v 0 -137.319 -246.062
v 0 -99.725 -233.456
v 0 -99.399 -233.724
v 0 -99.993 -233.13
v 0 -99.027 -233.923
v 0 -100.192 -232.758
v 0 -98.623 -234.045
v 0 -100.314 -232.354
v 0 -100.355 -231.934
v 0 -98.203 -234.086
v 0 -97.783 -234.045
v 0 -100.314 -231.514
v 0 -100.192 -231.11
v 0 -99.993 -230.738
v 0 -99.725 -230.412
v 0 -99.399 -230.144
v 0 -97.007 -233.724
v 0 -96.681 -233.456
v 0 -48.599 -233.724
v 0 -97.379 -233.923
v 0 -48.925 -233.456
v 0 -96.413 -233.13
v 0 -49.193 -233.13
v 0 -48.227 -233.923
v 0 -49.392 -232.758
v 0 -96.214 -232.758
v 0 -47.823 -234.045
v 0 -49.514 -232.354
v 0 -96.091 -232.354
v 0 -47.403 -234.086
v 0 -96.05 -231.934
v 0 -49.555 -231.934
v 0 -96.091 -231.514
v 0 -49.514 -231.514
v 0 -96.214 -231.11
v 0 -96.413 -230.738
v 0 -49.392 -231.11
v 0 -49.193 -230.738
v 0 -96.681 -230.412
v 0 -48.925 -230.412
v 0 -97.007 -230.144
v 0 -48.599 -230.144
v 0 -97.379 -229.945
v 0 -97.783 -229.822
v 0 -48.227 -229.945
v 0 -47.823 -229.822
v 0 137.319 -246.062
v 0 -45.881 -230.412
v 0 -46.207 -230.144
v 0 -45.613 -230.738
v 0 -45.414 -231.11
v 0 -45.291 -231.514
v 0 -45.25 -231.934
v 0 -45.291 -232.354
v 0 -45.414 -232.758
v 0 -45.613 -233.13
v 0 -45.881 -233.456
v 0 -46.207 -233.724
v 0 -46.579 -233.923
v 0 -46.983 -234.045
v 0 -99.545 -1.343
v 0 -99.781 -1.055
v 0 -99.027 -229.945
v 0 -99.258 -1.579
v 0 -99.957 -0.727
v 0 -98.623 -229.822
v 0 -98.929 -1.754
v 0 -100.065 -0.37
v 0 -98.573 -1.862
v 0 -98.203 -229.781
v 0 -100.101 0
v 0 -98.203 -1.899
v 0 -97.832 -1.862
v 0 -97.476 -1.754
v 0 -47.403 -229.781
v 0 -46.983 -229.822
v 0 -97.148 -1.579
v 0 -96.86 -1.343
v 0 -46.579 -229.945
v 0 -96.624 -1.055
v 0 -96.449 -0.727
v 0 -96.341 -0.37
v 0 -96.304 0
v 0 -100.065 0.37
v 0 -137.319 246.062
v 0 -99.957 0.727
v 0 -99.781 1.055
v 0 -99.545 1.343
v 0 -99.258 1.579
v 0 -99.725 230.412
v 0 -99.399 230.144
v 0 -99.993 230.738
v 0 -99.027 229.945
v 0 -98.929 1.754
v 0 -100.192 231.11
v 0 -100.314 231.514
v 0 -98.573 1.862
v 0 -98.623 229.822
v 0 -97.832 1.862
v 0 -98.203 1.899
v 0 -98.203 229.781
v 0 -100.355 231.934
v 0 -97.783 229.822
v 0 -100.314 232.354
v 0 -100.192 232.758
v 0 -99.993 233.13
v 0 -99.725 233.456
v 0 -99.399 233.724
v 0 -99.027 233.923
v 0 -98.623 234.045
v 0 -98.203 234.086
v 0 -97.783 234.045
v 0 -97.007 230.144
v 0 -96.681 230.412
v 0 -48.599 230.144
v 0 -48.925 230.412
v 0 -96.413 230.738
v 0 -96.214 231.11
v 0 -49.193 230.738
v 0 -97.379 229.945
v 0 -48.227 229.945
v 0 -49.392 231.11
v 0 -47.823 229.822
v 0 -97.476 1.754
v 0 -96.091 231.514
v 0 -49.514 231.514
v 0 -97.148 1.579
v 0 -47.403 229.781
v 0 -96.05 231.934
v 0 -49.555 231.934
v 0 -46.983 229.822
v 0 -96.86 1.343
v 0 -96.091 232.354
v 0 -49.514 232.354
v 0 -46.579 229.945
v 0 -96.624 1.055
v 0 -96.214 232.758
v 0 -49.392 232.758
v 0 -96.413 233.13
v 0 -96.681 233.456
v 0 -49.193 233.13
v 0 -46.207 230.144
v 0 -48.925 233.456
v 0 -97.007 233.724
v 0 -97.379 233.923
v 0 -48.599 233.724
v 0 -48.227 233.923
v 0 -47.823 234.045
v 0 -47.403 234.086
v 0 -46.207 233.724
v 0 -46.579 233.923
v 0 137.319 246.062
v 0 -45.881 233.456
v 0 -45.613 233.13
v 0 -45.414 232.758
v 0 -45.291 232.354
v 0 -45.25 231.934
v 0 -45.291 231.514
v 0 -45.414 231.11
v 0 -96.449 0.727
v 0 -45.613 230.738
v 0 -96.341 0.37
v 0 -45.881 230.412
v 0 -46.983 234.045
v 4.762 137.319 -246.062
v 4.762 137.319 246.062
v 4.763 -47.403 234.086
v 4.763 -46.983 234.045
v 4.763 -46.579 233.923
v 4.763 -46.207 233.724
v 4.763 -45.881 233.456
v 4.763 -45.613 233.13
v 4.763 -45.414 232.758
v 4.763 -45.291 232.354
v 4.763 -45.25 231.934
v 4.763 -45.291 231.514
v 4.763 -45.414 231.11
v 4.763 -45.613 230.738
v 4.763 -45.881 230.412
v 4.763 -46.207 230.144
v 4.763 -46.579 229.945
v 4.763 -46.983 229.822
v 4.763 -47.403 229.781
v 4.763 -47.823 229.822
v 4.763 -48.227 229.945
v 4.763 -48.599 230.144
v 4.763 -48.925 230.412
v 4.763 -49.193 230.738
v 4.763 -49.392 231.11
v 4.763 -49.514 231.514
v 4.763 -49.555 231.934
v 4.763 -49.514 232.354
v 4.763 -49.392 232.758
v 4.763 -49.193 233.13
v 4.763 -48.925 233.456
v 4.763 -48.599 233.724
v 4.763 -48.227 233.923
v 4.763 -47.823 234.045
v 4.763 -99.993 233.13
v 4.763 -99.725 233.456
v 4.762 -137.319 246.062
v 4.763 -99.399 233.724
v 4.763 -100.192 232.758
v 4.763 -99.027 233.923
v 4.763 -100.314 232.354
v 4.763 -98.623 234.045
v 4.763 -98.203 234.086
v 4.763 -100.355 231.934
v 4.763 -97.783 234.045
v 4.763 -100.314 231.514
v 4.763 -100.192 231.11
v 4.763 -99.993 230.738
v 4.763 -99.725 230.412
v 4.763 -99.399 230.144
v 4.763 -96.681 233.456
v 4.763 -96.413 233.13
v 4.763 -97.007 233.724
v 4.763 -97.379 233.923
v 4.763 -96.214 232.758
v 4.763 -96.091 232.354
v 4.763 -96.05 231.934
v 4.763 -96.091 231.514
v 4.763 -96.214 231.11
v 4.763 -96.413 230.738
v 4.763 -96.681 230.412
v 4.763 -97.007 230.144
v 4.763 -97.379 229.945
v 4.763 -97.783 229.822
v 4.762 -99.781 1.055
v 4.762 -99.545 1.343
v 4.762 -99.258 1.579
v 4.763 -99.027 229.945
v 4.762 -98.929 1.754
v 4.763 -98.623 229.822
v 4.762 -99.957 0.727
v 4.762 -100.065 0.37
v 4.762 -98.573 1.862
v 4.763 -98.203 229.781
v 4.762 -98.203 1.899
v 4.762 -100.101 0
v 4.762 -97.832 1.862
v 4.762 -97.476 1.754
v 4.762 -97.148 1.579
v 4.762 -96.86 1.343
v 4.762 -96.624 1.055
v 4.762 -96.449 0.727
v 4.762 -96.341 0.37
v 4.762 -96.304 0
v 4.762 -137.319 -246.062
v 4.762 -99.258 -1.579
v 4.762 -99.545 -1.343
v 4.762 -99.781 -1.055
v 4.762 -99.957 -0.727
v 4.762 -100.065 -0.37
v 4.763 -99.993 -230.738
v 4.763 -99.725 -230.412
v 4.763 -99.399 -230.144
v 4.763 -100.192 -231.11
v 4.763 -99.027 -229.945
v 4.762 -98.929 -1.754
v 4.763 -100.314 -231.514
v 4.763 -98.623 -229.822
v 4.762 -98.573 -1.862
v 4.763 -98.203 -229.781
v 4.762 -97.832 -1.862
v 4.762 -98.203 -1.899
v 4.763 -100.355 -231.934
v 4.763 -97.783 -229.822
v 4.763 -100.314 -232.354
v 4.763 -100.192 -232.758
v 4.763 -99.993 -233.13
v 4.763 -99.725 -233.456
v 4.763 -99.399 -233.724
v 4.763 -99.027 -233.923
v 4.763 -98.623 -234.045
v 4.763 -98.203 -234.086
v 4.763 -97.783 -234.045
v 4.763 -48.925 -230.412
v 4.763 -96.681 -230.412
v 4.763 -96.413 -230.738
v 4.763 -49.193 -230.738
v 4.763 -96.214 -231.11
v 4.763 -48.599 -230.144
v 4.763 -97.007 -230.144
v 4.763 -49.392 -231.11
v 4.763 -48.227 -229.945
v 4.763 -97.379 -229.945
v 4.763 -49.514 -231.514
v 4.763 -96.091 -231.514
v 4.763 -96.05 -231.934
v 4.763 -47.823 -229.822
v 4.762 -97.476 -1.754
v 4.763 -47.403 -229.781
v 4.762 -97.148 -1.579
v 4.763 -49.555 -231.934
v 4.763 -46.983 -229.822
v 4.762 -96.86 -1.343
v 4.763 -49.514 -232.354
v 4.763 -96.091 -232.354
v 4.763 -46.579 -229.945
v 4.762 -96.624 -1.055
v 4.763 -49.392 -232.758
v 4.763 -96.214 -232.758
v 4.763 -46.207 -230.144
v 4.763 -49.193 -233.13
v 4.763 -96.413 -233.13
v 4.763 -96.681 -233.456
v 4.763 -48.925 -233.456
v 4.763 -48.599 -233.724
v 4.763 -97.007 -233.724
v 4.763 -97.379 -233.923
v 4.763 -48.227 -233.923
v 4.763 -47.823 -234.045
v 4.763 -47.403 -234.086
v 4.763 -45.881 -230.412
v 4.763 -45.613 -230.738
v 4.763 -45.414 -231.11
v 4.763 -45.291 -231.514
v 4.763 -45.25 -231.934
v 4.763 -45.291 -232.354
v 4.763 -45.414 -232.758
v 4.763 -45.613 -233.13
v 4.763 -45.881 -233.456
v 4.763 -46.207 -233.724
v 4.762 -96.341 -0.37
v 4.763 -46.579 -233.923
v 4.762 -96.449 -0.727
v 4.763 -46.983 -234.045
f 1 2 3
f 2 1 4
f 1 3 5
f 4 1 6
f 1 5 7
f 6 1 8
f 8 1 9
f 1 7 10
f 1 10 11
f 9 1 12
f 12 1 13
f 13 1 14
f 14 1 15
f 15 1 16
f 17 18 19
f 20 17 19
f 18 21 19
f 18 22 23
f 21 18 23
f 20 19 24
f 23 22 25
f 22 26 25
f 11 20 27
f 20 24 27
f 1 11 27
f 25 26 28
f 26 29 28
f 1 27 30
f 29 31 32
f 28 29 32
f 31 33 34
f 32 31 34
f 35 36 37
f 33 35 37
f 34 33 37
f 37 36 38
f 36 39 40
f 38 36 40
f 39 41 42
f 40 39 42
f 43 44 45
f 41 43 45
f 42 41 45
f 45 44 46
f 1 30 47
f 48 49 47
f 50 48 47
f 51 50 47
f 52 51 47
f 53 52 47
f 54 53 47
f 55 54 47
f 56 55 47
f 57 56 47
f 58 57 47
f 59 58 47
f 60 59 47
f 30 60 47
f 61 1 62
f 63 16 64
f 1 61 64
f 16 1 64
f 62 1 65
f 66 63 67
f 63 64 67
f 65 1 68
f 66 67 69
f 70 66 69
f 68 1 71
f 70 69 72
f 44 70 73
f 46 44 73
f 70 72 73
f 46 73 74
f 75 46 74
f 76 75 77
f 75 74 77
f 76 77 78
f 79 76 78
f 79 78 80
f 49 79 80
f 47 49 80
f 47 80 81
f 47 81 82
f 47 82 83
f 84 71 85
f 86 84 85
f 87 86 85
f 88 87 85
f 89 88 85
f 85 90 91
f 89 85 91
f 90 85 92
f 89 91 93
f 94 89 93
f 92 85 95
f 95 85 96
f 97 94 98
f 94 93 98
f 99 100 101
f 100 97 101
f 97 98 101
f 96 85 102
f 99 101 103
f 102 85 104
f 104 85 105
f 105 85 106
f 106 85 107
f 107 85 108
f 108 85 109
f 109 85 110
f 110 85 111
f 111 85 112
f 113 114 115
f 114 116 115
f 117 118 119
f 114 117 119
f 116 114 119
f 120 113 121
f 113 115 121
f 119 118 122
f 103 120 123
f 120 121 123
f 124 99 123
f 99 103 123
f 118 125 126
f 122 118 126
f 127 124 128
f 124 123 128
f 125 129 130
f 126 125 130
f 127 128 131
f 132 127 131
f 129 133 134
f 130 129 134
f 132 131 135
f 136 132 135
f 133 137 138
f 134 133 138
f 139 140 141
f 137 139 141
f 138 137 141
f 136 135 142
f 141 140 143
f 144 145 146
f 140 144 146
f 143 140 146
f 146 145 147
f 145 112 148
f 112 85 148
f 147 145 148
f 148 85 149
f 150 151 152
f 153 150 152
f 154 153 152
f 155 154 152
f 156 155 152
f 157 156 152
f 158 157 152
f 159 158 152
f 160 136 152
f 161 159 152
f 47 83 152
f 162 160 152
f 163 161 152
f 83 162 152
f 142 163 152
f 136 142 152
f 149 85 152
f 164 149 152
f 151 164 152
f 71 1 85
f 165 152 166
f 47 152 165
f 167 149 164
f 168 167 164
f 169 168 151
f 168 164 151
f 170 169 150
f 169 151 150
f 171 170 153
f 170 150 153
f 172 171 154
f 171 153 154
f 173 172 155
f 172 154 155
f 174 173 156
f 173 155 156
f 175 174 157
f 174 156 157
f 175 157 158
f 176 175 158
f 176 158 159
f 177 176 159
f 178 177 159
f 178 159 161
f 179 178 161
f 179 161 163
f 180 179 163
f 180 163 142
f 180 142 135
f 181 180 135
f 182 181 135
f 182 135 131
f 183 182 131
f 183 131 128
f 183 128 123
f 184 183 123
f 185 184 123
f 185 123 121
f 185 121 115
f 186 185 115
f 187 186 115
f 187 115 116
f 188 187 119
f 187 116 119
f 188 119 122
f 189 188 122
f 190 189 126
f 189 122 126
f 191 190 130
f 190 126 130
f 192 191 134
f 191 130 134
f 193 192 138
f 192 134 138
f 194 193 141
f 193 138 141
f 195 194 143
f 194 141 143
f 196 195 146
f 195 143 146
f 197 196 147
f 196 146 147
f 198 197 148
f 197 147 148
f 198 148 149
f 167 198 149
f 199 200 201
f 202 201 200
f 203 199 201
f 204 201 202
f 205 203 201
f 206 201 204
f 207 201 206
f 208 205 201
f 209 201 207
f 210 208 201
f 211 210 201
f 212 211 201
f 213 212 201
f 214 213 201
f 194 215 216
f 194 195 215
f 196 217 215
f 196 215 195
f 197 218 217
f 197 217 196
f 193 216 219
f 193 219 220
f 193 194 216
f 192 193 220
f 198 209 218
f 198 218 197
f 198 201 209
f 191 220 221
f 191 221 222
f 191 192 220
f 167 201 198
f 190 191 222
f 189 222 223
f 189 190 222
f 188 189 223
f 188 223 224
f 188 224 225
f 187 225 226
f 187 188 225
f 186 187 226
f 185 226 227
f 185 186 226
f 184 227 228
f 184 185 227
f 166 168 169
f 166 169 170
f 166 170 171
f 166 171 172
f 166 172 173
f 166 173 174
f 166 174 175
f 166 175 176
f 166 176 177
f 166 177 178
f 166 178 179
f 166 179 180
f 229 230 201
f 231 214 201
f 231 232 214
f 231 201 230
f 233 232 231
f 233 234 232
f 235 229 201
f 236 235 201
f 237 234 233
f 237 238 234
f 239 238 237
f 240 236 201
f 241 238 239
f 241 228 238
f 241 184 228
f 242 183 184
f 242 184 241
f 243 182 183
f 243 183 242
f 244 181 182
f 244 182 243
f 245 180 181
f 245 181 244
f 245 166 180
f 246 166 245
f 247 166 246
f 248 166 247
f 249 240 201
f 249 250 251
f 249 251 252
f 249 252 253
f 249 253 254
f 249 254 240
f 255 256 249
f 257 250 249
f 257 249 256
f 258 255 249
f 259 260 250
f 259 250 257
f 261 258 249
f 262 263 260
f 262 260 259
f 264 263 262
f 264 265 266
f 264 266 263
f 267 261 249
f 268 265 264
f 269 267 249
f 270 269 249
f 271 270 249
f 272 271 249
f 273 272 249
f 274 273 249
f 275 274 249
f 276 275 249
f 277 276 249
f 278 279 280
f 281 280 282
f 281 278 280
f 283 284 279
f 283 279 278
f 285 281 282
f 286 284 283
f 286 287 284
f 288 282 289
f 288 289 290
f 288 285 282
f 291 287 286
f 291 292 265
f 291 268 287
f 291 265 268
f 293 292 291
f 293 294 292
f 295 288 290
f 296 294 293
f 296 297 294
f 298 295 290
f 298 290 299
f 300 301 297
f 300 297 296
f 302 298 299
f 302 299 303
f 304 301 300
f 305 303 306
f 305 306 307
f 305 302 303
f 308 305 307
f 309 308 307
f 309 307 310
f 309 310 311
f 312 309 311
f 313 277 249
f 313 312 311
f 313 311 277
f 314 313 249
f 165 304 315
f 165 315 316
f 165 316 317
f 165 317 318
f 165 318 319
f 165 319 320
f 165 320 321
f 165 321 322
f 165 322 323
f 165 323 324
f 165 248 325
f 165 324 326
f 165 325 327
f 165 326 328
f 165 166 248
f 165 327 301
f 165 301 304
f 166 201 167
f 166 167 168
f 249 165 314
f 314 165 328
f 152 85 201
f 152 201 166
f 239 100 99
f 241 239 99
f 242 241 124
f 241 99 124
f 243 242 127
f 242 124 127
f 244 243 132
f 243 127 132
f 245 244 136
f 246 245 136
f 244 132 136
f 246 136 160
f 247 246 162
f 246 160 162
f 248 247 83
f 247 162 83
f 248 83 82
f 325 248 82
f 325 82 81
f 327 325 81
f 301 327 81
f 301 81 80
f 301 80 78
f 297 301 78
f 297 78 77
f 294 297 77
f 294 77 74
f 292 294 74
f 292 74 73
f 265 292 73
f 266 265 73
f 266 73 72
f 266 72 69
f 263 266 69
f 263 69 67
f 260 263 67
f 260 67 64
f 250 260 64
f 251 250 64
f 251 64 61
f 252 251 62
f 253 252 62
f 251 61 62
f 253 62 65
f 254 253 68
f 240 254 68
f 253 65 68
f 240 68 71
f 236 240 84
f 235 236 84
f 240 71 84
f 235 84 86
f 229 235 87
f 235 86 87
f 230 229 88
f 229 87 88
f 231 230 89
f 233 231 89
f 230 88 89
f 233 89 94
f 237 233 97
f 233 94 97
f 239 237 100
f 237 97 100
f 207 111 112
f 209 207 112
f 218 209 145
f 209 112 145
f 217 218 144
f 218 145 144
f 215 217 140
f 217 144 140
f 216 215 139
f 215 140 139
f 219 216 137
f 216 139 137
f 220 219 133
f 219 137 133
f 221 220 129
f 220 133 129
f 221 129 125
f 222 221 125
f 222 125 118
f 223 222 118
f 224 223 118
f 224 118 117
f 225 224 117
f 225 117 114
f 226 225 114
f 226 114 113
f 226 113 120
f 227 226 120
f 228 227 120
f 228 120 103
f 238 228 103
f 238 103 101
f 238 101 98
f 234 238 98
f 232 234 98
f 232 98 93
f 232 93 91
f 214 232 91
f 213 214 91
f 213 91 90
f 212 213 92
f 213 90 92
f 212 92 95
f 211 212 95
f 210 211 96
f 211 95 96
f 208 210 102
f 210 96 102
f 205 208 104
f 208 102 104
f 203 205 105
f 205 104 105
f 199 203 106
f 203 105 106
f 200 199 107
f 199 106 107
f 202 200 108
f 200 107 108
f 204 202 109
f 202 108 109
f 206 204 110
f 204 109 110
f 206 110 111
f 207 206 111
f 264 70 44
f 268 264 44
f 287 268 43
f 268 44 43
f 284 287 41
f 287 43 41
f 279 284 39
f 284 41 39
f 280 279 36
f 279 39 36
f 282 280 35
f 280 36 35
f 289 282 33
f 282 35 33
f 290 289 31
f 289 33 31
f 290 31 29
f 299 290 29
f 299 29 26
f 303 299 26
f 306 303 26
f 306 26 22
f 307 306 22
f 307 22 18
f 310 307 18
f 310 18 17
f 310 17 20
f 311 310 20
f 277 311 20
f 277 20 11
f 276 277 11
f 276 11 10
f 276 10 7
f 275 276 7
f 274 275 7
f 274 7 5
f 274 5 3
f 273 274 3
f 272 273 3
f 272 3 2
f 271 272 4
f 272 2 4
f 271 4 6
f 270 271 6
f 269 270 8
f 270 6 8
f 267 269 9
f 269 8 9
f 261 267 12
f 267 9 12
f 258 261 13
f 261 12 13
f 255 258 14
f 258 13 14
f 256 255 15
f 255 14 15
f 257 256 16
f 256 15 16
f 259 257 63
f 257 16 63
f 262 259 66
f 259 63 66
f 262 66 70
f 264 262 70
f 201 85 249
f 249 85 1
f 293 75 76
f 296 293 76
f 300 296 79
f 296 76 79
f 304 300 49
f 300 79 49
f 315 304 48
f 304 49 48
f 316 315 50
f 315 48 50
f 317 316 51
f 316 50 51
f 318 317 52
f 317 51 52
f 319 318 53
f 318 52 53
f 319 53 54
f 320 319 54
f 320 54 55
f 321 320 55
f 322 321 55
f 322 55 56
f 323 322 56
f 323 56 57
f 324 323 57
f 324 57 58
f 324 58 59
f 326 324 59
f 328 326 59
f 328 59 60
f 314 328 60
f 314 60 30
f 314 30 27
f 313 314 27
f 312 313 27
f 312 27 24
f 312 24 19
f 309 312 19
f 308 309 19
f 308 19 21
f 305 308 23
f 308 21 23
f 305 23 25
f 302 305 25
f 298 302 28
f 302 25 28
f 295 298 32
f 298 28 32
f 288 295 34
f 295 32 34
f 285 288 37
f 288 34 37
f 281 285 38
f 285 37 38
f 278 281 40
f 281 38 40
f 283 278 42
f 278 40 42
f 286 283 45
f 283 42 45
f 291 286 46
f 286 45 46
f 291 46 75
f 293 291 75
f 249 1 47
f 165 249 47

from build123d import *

# Parameters (mm, degrees)
SKETCH1_W                 = 492.125
SKETCH1_H                 = 274.6375
BOSS_EXTRUDE1_DEPTH       = 4.7625
CUT_EXTRUDE1_REACH        = 6.763
BOSS_EXTRUDE2_REACH       = 494.125
SKETCH3_W                 = 4.7625
SKETCH3_H                 = 274.6375
F_8_CLEARANCE_HOLE1_D     = 4.3053
F_8_CLEARANCE_HOLE1_DEPTH = 74.422
F_8_CLEARANCE_HOLE1_TIP   = 1.293442612
F_6_CLEARANCE_HOLE1_D     = 3.7973
F_6_CLEARANCE_HOLE1_DEPTH = 25.4
F_6_CLEARANCE_HOLE1_TIP   = 1.140824014


with BuildPart() as part:
    # Sketch1 → Boss-Extrude1 (new body)
    with BuildSketch(Plane(origin=(0, 0, 0), x_dir=(0, 0, -1), z_dir=(1, 0, 0))):
        Rectangle(SKETCH1_W, SKETCH1_H)
    extrude(amount=BOSS_EXTRUDE1_DEPTH)

    # Sketch2 → Cut-Extrude1 (cut, up to next)
    with BuildSketch(Plane(origin=(4.7625, 0, 0), x_dir=(0, 0, -1), z_dir=(1, 0, 0)), mode=Mode.PRIVATE) as cut_extrude1_sk1:
        Polygon((-24.852813742, -60), (24.852813742, -60), (42.426406871, -42.426406871), (60, -24.852813742), (60, 24.852813742), (24.852813742, 60), (-24.852813742, 60), (-60, 24.852813742), (-60, -24.852813742), align=None)
    cut_extrude1_tool1 = extrude(cut_extrude1_sk1.sketch, amount=-CUT_EXTRUDE1_REACH, mode=Mode.PRIVATE) & part.part
    add(cut_extrude1_tool1.solids().sort_by_distance((4.7625, 0, 0))[0], mode=Mode.SUBTRACT)

    # Sketch3 → Boss-Extrude2 (add, up to next)
    with BuildSketch(Plane.XY.offset(246.0625), mode=Mode.PRIVATE) as boss_extrude2_sk1:
        with Locations((2.38125, 0)):
            Rectangle(SKETCH3_W, SKETCH3_H)
    boss_extrude2_tool1 = extrude(boss_extrude2_sk1.sketch, amount=-BOSS_EXTRUDE2_REACH, mode=Mode.PRIVATE) - part.part
    add(boss_extrude2_tool1.solids().sort_by_distance((2.38125, 0, 246.0625))[0])

    # #8 Clearance Hole1
    with Locations(Plane(origin=(4.7625, 0, 0), x_dir=(0, 0, -1), z_dir=(1, 0, 0))):
        with Locations((-231.93375, -98.20275), (-231.93375, -47.40275), (231.93375, -47.40275), (231.93375, -98.20275)):
            Hole(F_8_CLEARANCE_HOLE1_D / 2, depth=F_8_CLEARANCE_HOLE1_DEPTH)
            with Locations((0, 0, -(F_8_CLEARANCE_HOLE1_DEPTH + F_8_CLEARANCE_HOLE1_TIP / 2))):  # 118° drill point
                Cone(0, F_8_CLEARANCE_HOLE1_D / 2, F_8_CLEARANCE_HOLE1_TIP, mode=Mode.SUBTRACT)

    # #6 Clearance Hole1
    with Locations(Plane(origin=(4.7625, 0, 0), x_dir=(0, 0, -1), z_dir=(1, 0, 0))):
        with Locations((0, -98.20275)):
            Hole(F_6_CLEARANCE_HOLE1_D / 2, depth=F_6_CLEARANCE_HOLE1_DEPTH)
            with Locations((0, 0, -(F_6_CLEARANCE_HOLE1_DEPTH + F_6_CLEARANCE_HOLE1_TIP / 2))):  # 118° drill point
                Cone(0, F_6_CLEARANCE_HOLE1_D / 2, F_6_CLEARANCE_HOLE1_TIP, mode=Mode.SUBTRACT)


solid = part.part
